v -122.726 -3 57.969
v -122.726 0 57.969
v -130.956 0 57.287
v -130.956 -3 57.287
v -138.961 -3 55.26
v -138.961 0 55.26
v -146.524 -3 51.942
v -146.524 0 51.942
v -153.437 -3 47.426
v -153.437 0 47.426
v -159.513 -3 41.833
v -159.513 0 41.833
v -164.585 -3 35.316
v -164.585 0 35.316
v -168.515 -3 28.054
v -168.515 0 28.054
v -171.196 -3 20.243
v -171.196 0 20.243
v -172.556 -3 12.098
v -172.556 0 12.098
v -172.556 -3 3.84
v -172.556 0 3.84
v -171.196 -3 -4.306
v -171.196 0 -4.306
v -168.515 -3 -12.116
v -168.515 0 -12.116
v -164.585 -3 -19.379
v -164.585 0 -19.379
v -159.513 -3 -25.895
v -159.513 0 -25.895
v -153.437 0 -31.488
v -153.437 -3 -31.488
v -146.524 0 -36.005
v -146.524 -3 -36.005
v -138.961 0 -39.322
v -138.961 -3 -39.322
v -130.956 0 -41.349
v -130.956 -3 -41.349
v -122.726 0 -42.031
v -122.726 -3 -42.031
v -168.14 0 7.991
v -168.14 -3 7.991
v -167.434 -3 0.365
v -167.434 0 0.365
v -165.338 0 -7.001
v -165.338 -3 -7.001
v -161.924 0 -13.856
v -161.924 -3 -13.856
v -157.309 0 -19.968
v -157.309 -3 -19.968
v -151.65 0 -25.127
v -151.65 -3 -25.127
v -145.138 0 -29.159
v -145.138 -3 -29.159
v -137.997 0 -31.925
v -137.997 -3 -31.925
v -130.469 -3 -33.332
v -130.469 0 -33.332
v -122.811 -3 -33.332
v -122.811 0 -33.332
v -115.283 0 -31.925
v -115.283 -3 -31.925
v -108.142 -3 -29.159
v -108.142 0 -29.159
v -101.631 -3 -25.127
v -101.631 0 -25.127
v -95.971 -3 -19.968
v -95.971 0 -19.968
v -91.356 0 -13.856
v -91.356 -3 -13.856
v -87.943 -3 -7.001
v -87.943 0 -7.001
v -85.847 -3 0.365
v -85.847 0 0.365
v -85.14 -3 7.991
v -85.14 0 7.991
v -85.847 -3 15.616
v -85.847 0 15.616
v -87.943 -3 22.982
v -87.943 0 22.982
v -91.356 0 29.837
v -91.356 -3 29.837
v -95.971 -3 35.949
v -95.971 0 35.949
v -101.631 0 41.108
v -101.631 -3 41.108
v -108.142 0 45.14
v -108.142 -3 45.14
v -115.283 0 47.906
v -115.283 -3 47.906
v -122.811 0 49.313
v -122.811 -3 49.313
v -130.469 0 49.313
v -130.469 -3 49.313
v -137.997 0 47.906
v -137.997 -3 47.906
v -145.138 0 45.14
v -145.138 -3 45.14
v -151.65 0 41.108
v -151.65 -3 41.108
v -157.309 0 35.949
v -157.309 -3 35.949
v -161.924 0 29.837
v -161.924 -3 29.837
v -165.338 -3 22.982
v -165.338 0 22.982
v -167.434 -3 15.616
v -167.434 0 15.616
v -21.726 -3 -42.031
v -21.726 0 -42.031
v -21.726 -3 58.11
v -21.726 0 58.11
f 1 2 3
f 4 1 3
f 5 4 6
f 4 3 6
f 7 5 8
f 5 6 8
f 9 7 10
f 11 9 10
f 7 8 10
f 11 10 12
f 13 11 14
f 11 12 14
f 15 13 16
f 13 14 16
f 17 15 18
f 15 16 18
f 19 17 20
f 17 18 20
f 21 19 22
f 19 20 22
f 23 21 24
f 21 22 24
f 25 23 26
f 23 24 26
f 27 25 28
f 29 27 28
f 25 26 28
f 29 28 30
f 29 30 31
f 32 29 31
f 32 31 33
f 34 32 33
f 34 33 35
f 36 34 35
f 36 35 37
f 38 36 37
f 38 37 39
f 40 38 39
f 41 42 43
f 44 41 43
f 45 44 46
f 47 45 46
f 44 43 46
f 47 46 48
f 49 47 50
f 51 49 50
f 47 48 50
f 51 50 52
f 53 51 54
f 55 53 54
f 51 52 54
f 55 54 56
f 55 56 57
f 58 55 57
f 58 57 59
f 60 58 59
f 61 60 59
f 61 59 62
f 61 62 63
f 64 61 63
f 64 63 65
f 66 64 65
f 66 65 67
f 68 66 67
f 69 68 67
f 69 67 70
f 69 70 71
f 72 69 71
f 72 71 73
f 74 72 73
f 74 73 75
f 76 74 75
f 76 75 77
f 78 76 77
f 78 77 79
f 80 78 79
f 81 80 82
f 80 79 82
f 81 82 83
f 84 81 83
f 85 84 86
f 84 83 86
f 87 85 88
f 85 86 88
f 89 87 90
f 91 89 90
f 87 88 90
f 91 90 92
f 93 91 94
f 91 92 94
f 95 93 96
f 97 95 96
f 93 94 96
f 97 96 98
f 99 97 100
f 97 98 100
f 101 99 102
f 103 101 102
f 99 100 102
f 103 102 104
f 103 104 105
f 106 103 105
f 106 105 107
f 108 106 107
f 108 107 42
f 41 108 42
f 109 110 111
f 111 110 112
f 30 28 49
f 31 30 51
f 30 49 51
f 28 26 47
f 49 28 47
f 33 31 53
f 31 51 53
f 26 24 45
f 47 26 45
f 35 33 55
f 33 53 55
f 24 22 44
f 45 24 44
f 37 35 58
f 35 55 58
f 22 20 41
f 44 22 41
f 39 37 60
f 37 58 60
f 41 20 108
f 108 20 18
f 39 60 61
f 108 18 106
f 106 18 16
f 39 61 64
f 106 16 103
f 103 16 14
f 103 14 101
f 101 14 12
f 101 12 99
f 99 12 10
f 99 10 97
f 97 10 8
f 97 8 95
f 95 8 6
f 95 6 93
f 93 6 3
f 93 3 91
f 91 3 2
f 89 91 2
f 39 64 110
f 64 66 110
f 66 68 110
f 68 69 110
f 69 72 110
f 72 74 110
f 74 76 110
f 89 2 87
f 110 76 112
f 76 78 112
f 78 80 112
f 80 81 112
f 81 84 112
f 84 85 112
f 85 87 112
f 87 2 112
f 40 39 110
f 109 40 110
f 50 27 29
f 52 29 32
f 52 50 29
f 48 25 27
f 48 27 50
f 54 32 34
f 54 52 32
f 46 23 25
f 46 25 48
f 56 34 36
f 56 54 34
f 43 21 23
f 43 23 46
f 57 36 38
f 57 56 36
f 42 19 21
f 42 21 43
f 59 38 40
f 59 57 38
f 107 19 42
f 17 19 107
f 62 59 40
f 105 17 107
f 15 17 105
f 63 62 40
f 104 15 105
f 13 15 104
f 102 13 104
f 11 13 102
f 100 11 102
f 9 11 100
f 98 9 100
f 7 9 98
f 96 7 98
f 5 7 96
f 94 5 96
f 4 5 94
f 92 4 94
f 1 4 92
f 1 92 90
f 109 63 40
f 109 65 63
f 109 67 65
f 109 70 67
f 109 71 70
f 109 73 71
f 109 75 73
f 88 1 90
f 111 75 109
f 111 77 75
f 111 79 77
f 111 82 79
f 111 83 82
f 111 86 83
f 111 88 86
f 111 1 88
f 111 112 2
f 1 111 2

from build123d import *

# Parameters (mm, degrees)
F2_DEPTH = 3
F3_D     = 83


with BuildPart() as f2:
    # F0 (on Front) → F2 (new body)
    with BuildSketch(Plane.XZ):
        with BuildLine():
            Line((-21.7263168246, 58.1104420125), (-122.7263168246, 57.9687414691))
            ThreePointArc((-122.7263168246, 57.9687414691), (-172.7263168246, 7.9687414691), (-122.7263168246, -42.0312585309))
            Line((-122.7263168246, -42.0312585309), (-21.7263168246, -42.0312585309))
            Line((-21.7263168246, -42.0312585309), (-21.7263168246, 57.9687414691))
            Line((-21.7263168246, 57.9687414691), (-21.7263168246, 57.9720512033))
            Line((-21.7263168246, 57.9720512033), (-21.7263168246, 58.1104420125))
        make_face()
    extrude(amount=F2_DEPTH)

    # F3 (through all)
    with Locations(Plane(origin=(0, 0, 0), x_dir=(1, 0, 0), z_dir=(0, 1, 0))):
        with Locations((-126.6402751207, -7.990530692)):
            Hole(F3_D / 2)


solid = f2.part
